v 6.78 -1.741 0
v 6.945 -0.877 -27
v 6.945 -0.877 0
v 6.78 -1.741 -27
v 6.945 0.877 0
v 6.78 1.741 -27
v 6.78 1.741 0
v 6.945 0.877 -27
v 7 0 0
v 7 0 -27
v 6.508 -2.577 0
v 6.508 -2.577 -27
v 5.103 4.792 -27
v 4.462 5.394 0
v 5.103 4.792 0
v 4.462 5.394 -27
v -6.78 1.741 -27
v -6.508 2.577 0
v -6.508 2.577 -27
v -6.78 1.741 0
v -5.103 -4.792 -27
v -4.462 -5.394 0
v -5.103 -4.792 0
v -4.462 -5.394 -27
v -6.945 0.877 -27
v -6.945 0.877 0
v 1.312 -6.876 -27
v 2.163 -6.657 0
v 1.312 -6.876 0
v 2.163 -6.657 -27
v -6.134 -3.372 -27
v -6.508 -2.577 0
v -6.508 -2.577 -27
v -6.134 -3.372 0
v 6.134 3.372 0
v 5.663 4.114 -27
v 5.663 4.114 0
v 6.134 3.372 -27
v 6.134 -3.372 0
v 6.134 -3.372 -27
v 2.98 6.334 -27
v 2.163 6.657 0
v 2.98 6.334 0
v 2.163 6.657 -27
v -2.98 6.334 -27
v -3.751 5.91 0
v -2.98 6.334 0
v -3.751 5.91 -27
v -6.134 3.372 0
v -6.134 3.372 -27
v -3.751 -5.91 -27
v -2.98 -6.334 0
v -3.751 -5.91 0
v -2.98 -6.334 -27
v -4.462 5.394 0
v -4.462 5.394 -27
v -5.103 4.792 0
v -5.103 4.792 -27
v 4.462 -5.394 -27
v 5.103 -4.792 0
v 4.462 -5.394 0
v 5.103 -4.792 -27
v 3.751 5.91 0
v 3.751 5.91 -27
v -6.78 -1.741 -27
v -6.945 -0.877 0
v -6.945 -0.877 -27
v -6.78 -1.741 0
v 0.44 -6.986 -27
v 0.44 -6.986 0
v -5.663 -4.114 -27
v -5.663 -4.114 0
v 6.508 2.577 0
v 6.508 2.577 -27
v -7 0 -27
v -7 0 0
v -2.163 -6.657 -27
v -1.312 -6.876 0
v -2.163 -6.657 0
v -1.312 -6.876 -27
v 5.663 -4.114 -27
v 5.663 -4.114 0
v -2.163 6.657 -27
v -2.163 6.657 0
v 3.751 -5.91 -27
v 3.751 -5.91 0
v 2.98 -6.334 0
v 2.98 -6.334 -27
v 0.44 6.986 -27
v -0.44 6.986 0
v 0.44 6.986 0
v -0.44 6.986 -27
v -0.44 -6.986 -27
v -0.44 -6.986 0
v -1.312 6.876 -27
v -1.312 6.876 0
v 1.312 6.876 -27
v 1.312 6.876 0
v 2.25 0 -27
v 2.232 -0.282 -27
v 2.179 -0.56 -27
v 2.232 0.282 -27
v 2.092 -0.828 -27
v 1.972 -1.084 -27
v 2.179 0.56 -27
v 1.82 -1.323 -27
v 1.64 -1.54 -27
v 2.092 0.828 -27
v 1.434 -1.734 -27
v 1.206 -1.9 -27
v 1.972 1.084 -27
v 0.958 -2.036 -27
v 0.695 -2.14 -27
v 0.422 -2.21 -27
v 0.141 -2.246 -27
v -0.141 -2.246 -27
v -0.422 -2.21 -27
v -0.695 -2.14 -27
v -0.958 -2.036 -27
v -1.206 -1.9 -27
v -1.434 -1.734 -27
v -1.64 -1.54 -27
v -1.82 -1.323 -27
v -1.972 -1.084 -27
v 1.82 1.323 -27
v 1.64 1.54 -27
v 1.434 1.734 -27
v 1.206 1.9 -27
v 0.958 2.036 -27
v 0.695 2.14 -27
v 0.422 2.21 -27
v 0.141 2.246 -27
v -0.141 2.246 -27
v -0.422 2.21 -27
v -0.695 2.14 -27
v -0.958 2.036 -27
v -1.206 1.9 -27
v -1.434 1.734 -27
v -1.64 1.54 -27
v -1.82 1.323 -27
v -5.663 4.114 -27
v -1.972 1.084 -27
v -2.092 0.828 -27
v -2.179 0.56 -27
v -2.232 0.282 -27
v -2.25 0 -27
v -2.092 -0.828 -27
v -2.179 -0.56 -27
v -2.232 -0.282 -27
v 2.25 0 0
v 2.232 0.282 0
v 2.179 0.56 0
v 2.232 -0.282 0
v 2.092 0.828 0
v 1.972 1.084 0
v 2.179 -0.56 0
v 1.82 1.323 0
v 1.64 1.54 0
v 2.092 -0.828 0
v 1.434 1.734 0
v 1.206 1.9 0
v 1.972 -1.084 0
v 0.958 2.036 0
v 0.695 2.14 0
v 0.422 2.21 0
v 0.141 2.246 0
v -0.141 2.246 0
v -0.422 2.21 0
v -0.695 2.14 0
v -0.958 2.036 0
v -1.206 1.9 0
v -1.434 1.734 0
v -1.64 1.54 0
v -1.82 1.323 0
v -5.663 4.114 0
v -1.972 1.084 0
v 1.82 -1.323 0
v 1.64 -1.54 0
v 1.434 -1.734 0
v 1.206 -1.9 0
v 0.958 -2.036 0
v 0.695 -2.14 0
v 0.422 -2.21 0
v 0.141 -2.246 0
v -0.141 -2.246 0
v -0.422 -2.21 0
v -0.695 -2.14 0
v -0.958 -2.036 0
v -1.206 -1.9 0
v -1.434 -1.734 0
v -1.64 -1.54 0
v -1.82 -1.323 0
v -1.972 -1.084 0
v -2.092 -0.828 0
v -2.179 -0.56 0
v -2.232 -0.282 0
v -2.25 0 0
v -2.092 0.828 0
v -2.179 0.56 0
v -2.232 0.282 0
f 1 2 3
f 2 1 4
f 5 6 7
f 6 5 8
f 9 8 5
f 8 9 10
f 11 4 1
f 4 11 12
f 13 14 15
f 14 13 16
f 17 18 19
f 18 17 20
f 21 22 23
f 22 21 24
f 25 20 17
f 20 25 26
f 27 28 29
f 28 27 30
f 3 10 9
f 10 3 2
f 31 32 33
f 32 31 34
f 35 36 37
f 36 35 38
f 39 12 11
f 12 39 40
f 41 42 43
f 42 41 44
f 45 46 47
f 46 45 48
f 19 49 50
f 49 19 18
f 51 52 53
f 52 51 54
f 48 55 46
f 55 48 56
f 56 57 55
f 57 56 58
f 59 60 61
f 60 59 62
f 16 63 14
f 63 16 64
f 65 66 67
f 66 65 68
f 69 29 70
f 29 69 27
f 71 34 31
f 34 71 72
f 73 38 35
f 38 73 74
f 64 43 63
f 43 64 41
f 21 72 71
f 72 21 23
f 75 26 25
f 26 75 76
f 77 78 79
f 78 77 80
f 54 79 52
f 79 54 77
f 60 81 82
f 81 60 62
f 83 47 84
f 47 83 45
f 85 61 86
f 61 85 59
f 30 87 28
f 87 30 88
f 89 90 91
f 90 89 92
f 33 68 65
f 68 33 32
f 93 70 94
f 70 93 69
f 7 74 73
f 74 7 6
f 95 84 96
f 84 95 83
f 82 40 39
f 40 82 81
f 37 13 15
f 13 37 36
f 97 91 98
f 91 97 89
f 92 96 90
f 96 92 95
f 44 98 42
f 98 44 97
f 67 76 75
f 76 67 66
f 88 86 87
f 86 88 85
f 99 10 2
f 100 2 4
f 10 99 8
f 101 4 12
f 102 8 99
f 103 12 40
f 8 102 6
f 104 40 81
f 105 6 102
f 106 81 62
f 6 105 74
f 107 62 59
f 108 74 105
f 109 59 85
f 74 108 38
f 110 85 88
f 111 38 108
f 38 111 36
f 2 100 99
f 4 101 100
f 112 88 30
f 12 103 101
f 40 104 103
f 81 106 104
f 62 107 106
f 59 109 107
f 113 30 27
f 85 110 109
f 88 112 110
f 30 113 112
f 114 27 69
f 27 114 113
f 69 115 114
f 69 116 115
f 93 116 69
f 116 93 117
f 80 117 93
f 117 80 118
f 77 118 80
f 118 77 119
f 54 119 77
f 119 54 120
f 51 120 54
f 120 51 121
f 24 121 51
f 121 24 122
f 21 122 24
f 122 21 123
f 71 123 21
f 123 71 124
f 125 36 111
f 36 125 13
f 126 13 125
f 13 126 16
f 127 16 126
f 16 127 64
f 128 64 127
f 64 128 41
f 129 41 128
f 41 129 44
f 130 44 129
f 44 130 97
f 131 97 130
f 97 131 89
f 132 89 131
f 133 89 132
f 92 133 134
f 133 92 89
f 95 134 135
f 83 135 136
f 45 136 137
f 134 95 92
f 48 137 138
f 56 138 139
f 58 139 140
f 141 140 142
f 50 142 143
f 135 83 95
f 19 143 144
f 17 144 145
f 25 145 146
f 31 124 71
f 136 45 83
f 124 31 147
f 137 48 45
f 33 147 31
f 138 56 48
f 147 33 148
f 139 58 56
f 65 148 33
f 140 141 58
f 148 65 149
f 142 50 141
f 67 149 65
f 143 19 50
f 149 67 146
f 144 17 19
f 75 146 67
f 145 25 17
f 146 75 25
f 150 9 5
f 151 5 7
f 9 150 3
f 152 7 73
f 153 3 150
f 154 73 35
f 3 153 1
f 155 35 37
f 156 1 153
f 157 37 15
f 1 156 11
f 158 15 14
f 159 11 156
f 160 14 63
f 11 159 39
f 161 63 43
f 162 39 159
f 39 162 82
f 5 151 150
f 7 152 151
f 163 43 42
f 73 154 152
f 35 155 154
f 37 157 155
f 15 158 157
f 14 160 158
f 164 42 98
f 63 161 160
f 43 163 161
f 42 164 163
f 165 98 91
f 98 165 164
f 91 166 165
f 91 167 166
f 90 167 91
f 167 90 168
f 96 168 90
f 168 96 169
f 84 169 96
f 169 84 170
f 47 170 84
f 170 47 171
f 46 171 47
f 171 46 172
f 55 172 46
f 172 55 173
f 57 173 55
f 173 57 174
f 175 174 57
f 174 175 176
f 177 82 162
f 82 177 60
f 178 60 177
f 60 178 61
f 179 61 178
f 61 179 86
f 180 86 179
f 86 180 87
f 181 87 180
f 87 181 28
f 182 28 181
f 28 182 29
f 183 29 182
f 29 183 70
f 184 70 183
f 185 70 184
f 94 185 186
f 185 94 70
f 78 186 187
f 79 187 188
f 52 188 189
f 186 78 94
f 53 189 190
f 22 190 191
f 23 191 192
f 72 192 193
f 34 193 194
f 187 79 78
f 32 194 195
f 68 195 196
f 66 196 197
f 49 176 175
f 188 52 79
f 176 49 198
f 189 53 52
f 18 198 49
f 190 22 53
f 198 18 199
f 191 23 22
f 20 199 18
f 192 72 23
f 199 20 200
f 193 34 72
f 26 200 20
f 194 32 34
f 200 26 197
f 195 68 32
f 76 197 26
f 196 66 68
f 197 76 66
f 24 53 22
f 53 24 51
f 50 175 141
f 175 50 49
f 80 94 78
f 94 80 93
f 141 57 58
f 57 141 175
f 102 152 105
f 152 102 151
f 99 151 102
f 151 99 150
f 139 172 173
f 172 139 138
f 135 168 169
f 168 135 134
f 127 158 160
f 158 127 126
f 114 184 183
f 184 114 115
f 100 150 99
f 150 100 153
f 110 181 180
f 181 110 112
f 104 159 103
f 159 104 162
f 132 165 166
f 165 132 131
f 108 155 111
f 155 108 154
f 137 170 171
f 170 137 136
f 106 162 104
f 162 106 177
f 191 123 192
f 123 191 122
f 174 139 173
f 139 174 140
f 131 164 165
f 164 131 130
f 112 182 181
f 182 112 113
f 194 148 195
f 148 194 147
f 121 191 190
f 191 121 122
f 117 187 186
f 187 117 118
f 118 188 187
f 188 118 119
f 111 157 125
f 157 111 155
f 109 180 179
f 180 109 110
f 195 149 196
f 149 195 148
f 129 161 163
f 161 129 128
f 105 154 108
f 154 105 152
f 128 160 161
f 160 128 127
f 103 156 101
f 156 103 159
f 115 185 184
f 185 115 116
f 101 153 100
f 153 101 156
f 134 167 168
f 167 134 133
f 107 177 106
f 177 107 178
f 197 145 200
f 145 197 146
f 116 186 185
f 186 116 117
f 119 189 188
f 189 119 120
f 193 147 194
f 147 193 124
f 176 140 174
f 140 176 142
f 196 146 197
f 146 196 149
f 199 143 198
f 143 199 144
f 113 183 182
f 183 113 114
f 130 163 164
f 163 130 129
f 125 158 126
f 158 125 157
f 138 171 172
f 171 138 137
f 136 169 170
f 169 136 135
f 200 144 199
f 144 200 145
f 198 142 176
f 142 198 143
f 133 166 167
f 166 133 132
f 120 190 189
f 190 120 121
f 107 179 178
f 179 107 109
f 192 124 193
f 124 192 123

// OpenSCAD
$fn = 50;


difference() {
	union() {
		translate(v = [0, 0, -27.0000000000]) {
			cylinder(h = 27, r = 7.0000000000);
		}
		cylinder(h = 0, r = 17.0000000000);
	}
	union() {
		#translate(v = [0, 0, -27]) {
			cylinder(h = 27, r = 2.2500000000);
		}
	}
}
